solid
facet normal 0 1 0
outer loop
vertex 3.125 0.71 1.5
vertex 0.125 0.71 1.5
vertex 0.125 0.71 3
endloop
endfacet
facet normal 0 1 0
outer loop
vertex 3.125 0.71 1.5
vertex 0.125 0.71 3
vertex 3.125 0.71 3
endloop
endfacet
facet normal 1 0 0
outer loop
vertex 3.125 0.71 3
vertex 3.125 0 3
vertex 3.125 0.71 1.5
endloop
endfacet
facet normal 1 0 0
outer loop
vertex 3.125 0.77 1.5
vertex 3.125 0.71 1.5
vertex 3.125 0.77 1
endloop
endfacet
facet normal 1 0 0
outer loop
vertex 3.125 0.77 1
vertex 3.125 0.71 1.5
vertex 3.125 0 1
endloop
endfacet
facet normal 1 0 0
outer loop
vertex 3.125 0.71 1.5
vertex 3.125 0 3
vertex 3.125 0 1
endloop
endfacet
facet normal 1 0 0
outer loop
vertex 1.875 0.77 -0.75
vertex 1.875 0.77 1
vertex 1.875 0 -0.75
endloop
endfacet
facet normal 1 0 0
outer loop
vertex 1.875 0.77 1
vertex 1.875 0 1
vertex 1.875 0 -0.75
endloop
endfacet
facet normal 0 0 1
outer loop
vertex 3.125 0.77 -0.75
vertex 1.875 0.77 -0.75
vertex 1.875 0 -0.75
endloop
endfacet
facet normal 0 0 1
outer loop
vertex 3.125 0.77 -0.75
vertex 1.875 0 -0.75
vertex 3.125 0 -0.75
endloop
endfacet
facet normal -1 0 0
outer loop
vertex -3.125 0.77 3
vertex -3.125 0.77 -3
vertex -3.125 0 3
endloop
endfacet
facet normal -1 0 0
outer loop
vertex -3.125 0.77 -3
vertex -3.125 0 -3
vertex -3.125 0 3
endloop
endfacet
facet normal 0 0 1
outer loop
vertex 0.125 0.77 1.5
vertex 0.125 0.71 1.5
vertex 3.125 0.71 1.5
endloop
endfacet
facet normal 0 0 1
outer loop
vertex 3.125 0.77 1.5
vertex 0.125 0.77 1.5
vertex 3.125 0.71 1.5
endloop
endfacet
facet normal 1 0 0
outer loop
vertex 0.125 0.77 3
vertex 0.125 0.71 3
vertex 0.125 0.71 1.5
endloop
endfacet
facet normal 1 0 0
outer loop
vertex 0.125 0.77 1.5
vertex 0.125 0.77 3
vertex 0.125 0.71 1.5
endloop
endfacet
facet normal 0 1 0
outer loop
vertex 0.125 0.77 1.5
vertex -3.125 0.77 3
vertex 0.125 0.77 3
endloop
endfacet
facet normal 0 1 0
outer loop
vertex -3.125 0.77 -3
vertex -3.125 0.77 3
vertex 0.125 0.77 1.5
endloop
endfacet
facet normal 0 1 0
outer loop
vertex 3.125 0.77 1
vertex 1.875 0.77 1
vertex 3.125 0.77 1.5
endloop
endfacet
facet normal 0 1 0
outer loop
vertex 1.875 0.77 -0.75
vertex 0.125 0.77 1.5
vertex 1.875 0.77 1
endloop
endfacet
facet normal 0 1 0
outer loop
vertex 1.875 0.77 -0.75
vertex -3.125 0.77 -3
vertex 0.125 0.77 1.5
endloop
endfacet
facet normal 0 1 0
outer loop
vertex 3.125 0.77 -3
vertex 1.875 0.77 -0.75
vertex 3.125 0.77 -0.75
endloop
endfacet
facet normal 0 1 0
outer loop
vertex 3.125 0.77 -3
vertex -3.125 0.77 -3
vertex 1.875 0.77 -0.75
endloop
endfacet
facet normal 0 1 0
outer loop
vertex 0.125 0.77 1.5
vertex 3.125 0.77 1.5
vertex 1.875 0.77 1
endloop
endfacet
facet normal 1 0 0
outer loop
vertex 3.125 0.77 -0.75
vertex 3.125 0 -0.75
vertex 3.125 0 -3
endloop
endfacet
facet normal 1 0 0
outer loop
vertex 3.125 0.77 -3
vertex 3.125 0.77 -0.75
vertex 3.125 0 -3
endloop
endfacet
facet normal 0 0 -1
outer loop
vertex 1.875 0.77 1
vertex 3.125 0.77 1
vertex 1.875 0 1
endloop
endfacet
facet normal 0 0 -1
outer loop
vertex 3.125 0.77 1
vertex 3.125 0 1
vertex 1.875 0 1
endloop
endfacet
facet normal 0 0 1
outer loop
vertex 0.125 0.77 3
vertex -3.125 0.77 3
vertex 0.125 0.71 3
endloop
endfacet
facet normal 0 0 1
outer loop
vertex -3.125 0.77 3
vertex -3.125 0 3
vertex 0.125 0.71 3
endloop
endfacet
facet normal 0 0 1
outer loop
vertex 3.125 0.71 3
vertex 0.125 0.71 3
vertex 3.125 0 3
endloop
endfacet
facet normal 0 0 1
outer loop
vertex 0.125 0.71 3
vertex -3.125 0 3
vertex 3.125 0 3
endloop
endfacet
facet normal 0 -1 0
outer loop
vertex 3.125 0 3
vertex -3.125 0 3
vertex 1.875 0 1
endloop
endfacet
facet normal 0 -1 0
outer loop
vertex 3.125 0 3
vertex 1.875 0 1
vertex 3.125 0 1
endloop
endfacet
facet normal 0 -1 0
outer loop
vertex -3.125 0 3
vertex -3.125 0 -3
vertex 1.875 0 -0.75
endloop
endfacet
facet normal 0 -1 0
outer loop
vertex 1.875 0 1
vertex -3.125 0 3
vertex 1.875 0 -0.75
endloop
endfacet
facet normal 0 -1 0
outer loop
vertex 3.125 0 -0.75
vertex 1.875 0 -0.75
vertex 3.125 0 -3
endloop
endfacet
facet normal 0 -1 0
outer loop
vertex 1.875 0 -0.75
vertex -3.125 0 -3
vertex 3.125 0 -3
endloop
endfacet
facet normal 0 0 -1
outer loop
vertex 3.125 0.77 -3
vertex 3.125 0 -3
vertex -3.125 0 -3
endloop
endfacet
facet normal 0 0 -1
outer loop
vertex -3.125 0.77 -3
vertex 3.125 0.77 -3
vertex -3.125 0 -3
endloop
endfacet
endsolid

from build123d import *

# Parameters (mm, degrees)
SKETCH1_W           = 6.25
SKETCH1_H           = 6
BOSS_EXTRUDE1_DEPTH = 0.71
BOSS_EXTRUDE2_DEPTH = 0.06
SKETCH3_W           = 1.25
SKETCH3_H           = 1.75
CUT_EXTRUDE1_DEPTH  = 1.71


with BuildPart() as part:
    # Sketch1 → Boss-Extrude1 (new body)
    with BuildSketch(Plane(origin=(0, 0, 0), x_dir=(1, 0, 0), z_dir=(0, 1, 0))):
        Rectangle(SKETCH1_W, SKETCH1_H)
    extrude(amount=BOSS_EXTRUDE1_DEPTH)

    # Sketch2 → Boss-Extrude2 (add)
    with BuildSketch(Plane(origin=(0, 0.71, 0), x_dir=(1, 0, 0), z_dir=(0, 1, 0))):
        Polygon((3.125, 3), (-3.125, 3), (-3.125, -3), (0.125, -3), (0.125, -1.5), (3.125, -1.5), (3.125, -1), (1.875, -1), (1.875, 0.75), (3.125, 0.75), align=None)
    extrude(amount=BOSS_EXTRUDE2_DEPTH)

    # Sketch3 → Cut-Extrude1 (cut, through all)
    with BuildSketch(Plane(origin=(0, 0.71, 0), x_dir=(1, 0, 0), z_dir=(0, 1, 0))):
        with Locations((2.5, -0.125)):
            Rectangle(SKETCH3_W, SKETCH3_H)
    extrude(amount=-CUT_EXTRUDE1_DEPTH, mode=Mode.SUBTRACT)


solid = part.part
